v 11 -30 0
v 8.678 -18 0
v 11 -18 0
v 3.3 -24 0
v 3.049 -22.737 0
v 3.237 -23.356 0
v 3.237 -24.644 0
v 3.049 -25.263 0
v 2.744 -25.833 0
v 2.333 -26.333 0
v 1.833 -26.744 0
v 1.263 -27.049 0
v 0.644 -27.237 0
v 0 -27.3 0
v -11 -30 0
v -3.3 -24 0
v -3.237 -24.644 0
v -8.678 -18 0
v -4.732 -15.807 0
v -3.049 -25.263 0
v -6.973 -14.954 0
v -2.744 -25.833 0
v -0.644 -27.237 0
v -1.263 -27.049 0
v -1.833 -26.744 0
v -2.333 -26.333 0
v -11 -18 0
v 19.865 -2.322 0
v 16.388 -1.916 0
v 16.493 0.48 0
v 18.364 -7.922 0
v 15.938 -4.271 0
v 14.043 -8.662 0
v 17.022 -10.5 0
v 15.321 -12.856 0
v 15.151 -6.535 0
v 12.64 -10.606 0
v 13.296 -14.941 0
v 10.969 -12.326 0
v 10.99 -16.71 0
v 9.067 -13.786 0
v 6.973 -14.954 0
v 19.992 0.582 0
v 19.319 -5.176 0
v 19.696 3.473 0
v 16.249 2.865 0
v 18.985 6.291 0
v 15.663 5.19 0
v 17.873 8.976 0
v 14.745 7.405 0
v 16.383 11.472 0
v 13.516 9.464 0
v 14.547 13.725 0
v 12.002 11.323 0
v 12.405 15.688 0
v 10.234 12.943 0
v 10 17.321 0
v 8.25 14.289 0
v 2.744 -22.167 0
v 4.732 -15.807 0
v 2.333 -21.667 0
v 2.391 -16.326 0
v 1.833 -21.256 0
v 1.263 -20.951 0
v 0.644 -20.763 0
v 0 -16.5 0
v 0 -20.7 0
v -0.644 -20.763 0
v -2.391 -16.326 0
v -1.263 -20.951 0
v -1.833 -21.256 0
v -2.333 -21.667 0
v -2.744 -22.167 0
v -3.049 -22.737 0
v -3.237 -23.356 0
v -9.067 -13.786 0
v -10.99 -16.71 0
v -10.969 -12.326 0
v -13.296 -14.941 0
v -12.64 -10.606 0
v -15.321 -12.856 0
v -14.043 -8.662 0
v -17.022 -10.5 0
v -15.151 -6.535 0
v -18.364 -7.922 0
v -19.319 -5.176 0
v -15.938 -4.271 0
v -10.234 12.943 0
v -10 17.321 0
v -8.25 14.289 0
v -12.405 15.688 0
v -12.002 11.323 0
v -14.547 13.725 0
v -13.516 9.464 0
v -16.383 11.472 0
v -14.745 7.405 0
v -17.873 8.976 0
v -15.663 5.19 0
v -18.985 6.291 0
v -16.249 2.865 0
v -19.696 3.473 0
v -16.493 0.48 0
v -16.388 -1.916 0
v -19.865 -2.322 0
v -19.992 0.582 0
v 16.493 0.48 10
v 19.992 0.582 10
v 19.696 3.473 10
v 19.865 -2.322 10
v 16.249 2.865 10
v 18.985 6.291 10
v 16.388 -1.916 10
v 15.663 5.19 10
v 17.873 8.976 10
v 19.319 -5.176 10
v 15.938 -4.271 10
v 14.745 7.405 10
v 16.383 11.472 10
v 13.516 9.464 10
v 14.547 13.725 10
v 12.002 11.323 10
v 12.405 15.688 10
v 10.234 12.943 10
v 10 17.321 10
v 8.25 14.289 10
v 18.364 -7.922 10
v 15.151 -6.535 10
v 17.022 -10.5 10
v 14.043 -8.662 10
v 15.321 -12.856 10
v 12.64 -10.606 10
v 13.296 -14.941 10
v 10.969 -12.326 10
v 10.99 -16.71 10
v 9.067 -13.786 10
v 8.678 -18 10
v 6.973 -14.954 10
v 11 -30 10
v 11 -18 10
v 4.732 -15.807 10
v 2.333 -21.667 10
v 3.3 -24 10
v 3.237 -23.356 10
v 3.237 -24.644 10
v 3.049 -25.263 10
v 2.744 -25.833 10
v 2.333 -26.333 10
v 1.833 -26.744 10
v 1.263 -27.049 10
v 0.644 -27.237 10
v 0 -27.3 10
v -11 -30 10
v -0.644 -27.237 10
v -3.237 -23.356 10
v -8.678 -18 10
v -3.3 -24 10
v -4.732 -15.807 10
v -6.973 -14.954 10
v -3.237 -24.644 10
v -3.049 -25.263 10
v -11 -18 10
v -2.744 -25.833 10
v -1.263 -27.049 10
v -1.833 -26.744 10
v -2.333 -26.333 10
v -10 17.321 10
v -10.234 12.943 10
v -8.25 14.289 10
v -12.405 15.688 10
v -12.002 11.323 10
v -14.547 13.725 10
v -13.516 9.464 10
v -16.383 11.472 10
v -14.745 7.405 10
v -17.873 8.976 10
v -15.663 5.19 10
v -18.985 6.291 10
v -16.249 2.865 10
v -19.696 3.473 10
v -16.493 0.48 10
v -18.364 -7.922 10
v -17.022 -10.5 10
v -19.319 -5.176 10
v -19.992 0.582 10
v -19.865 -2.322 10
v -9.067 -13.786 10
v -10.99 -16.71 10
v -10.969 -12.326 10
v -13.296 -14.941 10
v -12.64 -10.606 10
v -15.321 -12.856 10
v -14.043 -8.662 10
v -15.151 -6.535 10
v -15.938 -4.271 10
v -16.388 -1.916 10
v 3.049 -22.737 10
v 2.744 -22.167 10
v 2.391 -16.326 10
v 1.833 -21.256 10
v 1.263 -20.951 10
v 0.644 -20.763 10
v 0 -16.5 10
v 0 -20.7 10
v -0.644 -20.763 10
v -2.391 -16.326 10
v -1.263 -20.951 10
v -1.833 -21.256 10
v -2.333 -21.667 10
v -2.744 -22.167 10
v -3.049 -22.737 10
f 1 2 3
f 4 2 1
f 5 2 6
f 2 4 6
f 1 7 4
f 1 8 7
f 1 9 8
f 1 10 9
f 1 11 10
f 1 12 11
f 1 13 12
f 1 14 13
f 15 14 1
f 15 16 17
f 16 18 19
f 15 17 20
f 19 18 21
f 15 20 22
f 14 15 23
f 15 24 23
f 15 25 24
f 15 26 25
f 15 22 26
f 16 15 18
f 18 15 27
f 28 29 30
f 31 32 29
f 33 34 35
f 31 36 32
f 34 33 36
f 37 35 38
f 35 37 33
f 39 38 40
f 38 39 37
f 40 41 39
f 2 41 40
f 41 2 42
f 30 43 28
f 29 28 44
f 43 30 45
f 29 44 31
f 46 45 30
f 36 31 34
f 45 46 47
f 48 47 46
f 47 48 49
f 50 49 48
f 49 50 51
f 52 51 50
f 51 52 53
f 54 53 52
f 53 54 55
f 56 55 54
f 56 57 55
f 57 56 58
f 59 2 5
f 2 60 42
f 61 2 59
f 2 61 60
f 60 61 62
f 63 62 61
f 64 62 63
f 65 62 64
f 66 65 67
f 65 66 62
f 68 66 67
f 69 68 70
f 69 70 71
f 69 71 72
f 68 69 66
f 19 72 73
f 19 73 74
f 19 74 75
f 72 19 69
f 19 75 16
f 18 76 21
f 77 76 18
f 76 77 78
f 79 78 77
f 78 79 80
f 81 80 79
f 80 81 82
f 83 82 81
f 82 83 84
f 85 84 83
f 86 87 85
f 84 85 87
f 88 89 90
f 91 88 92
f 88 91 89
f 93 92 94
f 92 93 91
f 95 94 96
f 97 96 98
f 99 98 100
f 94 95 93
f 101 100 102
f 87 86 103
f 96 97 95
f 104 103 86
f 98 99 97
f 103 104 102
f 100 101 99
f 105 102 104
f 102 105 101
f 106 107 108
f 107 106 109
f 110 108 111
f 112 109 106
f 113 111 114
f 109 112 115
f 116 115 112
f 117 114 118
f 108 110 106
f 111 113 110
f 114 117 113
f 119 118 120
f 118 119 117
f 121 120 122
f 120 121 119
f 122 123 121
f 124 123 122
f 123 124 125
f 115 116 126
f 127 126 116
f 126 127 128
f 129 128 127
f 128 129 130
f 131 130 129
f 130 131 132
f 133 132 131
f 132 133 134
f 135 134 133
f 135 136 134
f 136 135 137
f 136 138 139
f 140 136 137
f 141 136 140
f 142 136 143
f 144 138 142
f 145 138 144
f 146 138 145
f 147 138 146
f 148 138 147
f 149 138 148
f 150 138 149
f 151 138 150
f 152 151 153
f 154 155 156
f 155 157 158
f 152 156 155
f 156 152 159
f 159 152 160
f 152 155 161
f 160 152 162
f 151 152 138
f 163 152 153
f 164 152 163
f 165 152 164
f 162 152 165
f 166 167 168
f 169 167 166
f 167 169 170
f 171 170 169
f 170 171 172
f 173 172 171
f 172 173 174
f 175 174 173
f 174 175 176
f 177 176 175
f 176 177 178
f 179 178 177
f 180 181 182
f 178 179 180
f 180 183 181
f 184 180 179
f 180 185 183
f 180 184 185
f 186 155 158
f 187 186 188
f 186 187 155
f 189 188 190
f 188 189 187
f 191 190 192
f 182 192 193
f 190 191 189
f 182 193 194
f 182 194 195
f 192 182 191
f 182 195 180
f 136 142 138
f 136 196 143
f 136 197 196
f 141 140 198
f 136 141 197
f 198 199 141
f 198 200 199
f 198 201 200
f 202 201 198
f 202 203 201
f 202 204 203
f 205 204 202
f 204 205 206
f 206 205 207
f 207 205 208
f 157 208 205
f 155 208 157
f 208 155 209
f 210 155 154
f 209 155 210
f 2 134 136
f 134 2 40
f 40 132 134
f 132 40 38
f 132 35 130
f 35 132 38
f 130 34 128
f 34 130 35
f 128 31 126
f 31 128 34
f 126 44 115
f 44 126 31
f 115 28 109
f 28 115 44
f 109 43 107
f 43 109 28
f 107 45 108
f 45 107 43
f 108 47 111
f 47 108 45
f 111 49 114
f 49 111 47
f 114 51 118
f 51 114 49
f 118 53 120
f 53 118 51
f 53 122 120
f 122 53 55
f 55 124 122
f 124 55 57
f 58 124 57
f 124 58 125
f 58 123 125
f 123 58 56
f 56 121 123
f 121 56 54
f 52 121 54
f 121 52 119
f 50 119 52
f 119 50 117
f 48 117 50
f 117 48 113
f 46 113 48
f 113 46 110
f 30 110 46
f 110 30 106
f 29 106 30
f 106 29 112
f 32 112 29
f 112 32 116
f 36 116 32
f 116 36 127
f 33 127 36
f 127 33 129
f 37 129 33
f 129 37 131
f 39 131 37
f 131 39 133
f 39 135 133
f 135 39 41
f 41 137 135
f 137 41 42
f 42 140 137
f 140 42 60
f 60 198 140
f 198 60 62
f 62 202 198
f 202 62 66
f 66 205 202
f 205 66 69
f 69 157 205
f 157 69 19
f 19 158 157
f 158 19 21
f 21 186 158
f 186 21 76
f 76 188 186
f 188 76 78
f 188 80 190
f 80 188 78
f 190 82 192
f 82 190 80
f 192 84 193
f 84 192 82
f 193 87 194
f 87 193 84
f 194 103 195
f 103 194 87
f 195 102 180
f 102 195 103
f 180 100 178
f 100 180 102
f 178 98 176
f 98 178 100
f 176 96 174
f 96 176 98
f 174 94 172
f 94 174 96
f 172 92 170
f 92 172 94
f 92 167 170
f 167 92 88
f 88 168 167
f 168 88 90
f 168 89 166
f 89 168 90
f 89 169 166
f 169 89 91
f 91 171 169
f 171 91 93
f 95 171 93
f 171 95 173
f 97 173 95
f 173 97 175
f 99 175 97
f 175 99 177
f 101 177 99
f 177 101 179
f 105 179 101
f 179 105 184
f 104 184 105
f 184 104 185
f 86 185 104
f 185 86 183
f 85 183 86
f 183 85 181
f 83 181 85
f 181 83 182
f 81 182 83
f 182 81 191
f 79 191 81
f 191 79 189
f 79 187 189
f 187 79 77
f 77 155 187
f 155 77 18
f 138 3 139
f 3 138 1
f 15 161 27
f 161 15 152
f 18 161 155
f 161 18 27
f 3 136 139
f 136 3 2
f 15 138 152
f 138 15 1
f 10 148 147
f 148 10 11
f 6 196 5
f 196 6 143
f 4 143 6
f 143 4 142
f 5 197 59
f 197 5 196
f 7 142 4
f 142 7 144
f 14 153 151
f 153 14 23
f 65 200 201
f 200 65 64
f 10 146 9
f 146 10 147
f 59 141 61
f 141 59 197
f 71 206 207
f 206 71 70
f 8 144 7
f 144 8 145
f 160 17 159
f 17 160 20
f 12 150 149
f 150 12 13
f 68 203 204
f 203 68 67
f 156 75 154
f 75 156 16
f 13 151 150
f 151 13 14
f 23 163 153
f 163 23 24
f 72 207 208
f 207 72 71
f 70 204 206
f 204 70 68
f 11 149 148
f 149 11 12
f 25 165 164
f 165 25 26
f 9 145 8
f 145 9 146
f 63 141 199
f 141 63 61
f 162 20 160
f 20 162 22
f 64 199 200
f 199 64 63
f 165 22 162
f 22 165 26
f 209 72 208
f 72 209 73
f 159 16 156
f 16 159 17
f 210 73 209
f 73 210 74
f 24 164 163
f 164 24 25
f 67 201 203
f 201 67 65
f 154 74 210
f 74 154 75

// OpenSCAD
$fn = 32;

// ----------------------------------------------------------------------
// Spring clip: 40 mm outside, 3.5 mm band, 60 degree opening
// ----------------------------------------------------------------------

// --- parameters (mm) ---
outer_r = 20;             // clip outside radius
inner_r = 16.5;           // clip bore radius
band = 3.5;               // band thickness
clip_w = 10;              // clip width
opening = 60;             // opening angle
tab_w = 22;               // tab width
tab_len = 10;             // tab length past the clip
tab_hole = 6.6;           // tab fixing hole

clip_profile = [[-10, 17.321], [-12.405, 15.688], [-14.547, 13.725], [-16.383, 11.472], [-17.873, 8.976], [-18.985, 6.291], [-19.696, 3.473], [-19.992, 0.582], [-19.865, -2.322], [-19.319, -5.176], [-18.364, -7.922], [-17.022, -10.5], [-15.321, -12.856], [-13.296, -14.941], [-10.99, -16.71], [-8.452, -18.126], [-5.736, -19.16], [-2.899, -19.789], [0, -20], [2.899, -19.789], [5.736, -19.16], [8.452, -18.126], [10.99, -16.71], [13.296, -14.941], [15.321, -12.856], [17.022, -10.5], [18.364, -7.922], [19.319, -5.176], [19.865, -2.322], [19.992, 0.582], [19.696, 3.473], [18.985, 6.291], [17.873, 8.976], [16.383, 11.472], [14.547, 13.725], [12.405, 15.688], [10, 17.321], [8.25, 14.289], [10.234, 12.943], [12.002, 11.323], [13.516, 9.464], [14.745, 7.405], [15.663, 5.19], [16.249, 2.865], [16.493, 0.48], [16.388, -1.916], [15.938, -4.271], [15.151, -6.535], [14.043, -8.662], [12.64, -10.606], [10.969, -12.326], [9.067, -13.786], [6.973, -14.954], [4.732, -15.807], [2.391, -16.326], [0, -16.5], [-2.391, -16.326], [-4.732, -15.807], [-6.973, -14.954], [-9.067, -13.786], [-10.969, -12.326], [-12.64, -10.606], [-14.043, -8.662], [-15.151, -6.535], [-15.938, -4.271], [-16.388, -1.916], [-16.493, 0.48], [-16.249, 2.865], [-15.663, 5.19], [-14.745, 7.405], [-13.516, 9.464], [-12.002, 11.323], [-10.234, 12.943], [-8.25, 14.289]];

difference() {
  union() {
    linear_extrude(height = clip_w) polygon(clip_profile);
    /* mounting tab, sunk 2 mm into the band */
    translate([-11, -30, 0]) cube([tab_w, 12, clip_w]);
  }
  translate([0, -24, -2.5]) cylinder(h = clip_w + 5, d = tab_hole);
}
